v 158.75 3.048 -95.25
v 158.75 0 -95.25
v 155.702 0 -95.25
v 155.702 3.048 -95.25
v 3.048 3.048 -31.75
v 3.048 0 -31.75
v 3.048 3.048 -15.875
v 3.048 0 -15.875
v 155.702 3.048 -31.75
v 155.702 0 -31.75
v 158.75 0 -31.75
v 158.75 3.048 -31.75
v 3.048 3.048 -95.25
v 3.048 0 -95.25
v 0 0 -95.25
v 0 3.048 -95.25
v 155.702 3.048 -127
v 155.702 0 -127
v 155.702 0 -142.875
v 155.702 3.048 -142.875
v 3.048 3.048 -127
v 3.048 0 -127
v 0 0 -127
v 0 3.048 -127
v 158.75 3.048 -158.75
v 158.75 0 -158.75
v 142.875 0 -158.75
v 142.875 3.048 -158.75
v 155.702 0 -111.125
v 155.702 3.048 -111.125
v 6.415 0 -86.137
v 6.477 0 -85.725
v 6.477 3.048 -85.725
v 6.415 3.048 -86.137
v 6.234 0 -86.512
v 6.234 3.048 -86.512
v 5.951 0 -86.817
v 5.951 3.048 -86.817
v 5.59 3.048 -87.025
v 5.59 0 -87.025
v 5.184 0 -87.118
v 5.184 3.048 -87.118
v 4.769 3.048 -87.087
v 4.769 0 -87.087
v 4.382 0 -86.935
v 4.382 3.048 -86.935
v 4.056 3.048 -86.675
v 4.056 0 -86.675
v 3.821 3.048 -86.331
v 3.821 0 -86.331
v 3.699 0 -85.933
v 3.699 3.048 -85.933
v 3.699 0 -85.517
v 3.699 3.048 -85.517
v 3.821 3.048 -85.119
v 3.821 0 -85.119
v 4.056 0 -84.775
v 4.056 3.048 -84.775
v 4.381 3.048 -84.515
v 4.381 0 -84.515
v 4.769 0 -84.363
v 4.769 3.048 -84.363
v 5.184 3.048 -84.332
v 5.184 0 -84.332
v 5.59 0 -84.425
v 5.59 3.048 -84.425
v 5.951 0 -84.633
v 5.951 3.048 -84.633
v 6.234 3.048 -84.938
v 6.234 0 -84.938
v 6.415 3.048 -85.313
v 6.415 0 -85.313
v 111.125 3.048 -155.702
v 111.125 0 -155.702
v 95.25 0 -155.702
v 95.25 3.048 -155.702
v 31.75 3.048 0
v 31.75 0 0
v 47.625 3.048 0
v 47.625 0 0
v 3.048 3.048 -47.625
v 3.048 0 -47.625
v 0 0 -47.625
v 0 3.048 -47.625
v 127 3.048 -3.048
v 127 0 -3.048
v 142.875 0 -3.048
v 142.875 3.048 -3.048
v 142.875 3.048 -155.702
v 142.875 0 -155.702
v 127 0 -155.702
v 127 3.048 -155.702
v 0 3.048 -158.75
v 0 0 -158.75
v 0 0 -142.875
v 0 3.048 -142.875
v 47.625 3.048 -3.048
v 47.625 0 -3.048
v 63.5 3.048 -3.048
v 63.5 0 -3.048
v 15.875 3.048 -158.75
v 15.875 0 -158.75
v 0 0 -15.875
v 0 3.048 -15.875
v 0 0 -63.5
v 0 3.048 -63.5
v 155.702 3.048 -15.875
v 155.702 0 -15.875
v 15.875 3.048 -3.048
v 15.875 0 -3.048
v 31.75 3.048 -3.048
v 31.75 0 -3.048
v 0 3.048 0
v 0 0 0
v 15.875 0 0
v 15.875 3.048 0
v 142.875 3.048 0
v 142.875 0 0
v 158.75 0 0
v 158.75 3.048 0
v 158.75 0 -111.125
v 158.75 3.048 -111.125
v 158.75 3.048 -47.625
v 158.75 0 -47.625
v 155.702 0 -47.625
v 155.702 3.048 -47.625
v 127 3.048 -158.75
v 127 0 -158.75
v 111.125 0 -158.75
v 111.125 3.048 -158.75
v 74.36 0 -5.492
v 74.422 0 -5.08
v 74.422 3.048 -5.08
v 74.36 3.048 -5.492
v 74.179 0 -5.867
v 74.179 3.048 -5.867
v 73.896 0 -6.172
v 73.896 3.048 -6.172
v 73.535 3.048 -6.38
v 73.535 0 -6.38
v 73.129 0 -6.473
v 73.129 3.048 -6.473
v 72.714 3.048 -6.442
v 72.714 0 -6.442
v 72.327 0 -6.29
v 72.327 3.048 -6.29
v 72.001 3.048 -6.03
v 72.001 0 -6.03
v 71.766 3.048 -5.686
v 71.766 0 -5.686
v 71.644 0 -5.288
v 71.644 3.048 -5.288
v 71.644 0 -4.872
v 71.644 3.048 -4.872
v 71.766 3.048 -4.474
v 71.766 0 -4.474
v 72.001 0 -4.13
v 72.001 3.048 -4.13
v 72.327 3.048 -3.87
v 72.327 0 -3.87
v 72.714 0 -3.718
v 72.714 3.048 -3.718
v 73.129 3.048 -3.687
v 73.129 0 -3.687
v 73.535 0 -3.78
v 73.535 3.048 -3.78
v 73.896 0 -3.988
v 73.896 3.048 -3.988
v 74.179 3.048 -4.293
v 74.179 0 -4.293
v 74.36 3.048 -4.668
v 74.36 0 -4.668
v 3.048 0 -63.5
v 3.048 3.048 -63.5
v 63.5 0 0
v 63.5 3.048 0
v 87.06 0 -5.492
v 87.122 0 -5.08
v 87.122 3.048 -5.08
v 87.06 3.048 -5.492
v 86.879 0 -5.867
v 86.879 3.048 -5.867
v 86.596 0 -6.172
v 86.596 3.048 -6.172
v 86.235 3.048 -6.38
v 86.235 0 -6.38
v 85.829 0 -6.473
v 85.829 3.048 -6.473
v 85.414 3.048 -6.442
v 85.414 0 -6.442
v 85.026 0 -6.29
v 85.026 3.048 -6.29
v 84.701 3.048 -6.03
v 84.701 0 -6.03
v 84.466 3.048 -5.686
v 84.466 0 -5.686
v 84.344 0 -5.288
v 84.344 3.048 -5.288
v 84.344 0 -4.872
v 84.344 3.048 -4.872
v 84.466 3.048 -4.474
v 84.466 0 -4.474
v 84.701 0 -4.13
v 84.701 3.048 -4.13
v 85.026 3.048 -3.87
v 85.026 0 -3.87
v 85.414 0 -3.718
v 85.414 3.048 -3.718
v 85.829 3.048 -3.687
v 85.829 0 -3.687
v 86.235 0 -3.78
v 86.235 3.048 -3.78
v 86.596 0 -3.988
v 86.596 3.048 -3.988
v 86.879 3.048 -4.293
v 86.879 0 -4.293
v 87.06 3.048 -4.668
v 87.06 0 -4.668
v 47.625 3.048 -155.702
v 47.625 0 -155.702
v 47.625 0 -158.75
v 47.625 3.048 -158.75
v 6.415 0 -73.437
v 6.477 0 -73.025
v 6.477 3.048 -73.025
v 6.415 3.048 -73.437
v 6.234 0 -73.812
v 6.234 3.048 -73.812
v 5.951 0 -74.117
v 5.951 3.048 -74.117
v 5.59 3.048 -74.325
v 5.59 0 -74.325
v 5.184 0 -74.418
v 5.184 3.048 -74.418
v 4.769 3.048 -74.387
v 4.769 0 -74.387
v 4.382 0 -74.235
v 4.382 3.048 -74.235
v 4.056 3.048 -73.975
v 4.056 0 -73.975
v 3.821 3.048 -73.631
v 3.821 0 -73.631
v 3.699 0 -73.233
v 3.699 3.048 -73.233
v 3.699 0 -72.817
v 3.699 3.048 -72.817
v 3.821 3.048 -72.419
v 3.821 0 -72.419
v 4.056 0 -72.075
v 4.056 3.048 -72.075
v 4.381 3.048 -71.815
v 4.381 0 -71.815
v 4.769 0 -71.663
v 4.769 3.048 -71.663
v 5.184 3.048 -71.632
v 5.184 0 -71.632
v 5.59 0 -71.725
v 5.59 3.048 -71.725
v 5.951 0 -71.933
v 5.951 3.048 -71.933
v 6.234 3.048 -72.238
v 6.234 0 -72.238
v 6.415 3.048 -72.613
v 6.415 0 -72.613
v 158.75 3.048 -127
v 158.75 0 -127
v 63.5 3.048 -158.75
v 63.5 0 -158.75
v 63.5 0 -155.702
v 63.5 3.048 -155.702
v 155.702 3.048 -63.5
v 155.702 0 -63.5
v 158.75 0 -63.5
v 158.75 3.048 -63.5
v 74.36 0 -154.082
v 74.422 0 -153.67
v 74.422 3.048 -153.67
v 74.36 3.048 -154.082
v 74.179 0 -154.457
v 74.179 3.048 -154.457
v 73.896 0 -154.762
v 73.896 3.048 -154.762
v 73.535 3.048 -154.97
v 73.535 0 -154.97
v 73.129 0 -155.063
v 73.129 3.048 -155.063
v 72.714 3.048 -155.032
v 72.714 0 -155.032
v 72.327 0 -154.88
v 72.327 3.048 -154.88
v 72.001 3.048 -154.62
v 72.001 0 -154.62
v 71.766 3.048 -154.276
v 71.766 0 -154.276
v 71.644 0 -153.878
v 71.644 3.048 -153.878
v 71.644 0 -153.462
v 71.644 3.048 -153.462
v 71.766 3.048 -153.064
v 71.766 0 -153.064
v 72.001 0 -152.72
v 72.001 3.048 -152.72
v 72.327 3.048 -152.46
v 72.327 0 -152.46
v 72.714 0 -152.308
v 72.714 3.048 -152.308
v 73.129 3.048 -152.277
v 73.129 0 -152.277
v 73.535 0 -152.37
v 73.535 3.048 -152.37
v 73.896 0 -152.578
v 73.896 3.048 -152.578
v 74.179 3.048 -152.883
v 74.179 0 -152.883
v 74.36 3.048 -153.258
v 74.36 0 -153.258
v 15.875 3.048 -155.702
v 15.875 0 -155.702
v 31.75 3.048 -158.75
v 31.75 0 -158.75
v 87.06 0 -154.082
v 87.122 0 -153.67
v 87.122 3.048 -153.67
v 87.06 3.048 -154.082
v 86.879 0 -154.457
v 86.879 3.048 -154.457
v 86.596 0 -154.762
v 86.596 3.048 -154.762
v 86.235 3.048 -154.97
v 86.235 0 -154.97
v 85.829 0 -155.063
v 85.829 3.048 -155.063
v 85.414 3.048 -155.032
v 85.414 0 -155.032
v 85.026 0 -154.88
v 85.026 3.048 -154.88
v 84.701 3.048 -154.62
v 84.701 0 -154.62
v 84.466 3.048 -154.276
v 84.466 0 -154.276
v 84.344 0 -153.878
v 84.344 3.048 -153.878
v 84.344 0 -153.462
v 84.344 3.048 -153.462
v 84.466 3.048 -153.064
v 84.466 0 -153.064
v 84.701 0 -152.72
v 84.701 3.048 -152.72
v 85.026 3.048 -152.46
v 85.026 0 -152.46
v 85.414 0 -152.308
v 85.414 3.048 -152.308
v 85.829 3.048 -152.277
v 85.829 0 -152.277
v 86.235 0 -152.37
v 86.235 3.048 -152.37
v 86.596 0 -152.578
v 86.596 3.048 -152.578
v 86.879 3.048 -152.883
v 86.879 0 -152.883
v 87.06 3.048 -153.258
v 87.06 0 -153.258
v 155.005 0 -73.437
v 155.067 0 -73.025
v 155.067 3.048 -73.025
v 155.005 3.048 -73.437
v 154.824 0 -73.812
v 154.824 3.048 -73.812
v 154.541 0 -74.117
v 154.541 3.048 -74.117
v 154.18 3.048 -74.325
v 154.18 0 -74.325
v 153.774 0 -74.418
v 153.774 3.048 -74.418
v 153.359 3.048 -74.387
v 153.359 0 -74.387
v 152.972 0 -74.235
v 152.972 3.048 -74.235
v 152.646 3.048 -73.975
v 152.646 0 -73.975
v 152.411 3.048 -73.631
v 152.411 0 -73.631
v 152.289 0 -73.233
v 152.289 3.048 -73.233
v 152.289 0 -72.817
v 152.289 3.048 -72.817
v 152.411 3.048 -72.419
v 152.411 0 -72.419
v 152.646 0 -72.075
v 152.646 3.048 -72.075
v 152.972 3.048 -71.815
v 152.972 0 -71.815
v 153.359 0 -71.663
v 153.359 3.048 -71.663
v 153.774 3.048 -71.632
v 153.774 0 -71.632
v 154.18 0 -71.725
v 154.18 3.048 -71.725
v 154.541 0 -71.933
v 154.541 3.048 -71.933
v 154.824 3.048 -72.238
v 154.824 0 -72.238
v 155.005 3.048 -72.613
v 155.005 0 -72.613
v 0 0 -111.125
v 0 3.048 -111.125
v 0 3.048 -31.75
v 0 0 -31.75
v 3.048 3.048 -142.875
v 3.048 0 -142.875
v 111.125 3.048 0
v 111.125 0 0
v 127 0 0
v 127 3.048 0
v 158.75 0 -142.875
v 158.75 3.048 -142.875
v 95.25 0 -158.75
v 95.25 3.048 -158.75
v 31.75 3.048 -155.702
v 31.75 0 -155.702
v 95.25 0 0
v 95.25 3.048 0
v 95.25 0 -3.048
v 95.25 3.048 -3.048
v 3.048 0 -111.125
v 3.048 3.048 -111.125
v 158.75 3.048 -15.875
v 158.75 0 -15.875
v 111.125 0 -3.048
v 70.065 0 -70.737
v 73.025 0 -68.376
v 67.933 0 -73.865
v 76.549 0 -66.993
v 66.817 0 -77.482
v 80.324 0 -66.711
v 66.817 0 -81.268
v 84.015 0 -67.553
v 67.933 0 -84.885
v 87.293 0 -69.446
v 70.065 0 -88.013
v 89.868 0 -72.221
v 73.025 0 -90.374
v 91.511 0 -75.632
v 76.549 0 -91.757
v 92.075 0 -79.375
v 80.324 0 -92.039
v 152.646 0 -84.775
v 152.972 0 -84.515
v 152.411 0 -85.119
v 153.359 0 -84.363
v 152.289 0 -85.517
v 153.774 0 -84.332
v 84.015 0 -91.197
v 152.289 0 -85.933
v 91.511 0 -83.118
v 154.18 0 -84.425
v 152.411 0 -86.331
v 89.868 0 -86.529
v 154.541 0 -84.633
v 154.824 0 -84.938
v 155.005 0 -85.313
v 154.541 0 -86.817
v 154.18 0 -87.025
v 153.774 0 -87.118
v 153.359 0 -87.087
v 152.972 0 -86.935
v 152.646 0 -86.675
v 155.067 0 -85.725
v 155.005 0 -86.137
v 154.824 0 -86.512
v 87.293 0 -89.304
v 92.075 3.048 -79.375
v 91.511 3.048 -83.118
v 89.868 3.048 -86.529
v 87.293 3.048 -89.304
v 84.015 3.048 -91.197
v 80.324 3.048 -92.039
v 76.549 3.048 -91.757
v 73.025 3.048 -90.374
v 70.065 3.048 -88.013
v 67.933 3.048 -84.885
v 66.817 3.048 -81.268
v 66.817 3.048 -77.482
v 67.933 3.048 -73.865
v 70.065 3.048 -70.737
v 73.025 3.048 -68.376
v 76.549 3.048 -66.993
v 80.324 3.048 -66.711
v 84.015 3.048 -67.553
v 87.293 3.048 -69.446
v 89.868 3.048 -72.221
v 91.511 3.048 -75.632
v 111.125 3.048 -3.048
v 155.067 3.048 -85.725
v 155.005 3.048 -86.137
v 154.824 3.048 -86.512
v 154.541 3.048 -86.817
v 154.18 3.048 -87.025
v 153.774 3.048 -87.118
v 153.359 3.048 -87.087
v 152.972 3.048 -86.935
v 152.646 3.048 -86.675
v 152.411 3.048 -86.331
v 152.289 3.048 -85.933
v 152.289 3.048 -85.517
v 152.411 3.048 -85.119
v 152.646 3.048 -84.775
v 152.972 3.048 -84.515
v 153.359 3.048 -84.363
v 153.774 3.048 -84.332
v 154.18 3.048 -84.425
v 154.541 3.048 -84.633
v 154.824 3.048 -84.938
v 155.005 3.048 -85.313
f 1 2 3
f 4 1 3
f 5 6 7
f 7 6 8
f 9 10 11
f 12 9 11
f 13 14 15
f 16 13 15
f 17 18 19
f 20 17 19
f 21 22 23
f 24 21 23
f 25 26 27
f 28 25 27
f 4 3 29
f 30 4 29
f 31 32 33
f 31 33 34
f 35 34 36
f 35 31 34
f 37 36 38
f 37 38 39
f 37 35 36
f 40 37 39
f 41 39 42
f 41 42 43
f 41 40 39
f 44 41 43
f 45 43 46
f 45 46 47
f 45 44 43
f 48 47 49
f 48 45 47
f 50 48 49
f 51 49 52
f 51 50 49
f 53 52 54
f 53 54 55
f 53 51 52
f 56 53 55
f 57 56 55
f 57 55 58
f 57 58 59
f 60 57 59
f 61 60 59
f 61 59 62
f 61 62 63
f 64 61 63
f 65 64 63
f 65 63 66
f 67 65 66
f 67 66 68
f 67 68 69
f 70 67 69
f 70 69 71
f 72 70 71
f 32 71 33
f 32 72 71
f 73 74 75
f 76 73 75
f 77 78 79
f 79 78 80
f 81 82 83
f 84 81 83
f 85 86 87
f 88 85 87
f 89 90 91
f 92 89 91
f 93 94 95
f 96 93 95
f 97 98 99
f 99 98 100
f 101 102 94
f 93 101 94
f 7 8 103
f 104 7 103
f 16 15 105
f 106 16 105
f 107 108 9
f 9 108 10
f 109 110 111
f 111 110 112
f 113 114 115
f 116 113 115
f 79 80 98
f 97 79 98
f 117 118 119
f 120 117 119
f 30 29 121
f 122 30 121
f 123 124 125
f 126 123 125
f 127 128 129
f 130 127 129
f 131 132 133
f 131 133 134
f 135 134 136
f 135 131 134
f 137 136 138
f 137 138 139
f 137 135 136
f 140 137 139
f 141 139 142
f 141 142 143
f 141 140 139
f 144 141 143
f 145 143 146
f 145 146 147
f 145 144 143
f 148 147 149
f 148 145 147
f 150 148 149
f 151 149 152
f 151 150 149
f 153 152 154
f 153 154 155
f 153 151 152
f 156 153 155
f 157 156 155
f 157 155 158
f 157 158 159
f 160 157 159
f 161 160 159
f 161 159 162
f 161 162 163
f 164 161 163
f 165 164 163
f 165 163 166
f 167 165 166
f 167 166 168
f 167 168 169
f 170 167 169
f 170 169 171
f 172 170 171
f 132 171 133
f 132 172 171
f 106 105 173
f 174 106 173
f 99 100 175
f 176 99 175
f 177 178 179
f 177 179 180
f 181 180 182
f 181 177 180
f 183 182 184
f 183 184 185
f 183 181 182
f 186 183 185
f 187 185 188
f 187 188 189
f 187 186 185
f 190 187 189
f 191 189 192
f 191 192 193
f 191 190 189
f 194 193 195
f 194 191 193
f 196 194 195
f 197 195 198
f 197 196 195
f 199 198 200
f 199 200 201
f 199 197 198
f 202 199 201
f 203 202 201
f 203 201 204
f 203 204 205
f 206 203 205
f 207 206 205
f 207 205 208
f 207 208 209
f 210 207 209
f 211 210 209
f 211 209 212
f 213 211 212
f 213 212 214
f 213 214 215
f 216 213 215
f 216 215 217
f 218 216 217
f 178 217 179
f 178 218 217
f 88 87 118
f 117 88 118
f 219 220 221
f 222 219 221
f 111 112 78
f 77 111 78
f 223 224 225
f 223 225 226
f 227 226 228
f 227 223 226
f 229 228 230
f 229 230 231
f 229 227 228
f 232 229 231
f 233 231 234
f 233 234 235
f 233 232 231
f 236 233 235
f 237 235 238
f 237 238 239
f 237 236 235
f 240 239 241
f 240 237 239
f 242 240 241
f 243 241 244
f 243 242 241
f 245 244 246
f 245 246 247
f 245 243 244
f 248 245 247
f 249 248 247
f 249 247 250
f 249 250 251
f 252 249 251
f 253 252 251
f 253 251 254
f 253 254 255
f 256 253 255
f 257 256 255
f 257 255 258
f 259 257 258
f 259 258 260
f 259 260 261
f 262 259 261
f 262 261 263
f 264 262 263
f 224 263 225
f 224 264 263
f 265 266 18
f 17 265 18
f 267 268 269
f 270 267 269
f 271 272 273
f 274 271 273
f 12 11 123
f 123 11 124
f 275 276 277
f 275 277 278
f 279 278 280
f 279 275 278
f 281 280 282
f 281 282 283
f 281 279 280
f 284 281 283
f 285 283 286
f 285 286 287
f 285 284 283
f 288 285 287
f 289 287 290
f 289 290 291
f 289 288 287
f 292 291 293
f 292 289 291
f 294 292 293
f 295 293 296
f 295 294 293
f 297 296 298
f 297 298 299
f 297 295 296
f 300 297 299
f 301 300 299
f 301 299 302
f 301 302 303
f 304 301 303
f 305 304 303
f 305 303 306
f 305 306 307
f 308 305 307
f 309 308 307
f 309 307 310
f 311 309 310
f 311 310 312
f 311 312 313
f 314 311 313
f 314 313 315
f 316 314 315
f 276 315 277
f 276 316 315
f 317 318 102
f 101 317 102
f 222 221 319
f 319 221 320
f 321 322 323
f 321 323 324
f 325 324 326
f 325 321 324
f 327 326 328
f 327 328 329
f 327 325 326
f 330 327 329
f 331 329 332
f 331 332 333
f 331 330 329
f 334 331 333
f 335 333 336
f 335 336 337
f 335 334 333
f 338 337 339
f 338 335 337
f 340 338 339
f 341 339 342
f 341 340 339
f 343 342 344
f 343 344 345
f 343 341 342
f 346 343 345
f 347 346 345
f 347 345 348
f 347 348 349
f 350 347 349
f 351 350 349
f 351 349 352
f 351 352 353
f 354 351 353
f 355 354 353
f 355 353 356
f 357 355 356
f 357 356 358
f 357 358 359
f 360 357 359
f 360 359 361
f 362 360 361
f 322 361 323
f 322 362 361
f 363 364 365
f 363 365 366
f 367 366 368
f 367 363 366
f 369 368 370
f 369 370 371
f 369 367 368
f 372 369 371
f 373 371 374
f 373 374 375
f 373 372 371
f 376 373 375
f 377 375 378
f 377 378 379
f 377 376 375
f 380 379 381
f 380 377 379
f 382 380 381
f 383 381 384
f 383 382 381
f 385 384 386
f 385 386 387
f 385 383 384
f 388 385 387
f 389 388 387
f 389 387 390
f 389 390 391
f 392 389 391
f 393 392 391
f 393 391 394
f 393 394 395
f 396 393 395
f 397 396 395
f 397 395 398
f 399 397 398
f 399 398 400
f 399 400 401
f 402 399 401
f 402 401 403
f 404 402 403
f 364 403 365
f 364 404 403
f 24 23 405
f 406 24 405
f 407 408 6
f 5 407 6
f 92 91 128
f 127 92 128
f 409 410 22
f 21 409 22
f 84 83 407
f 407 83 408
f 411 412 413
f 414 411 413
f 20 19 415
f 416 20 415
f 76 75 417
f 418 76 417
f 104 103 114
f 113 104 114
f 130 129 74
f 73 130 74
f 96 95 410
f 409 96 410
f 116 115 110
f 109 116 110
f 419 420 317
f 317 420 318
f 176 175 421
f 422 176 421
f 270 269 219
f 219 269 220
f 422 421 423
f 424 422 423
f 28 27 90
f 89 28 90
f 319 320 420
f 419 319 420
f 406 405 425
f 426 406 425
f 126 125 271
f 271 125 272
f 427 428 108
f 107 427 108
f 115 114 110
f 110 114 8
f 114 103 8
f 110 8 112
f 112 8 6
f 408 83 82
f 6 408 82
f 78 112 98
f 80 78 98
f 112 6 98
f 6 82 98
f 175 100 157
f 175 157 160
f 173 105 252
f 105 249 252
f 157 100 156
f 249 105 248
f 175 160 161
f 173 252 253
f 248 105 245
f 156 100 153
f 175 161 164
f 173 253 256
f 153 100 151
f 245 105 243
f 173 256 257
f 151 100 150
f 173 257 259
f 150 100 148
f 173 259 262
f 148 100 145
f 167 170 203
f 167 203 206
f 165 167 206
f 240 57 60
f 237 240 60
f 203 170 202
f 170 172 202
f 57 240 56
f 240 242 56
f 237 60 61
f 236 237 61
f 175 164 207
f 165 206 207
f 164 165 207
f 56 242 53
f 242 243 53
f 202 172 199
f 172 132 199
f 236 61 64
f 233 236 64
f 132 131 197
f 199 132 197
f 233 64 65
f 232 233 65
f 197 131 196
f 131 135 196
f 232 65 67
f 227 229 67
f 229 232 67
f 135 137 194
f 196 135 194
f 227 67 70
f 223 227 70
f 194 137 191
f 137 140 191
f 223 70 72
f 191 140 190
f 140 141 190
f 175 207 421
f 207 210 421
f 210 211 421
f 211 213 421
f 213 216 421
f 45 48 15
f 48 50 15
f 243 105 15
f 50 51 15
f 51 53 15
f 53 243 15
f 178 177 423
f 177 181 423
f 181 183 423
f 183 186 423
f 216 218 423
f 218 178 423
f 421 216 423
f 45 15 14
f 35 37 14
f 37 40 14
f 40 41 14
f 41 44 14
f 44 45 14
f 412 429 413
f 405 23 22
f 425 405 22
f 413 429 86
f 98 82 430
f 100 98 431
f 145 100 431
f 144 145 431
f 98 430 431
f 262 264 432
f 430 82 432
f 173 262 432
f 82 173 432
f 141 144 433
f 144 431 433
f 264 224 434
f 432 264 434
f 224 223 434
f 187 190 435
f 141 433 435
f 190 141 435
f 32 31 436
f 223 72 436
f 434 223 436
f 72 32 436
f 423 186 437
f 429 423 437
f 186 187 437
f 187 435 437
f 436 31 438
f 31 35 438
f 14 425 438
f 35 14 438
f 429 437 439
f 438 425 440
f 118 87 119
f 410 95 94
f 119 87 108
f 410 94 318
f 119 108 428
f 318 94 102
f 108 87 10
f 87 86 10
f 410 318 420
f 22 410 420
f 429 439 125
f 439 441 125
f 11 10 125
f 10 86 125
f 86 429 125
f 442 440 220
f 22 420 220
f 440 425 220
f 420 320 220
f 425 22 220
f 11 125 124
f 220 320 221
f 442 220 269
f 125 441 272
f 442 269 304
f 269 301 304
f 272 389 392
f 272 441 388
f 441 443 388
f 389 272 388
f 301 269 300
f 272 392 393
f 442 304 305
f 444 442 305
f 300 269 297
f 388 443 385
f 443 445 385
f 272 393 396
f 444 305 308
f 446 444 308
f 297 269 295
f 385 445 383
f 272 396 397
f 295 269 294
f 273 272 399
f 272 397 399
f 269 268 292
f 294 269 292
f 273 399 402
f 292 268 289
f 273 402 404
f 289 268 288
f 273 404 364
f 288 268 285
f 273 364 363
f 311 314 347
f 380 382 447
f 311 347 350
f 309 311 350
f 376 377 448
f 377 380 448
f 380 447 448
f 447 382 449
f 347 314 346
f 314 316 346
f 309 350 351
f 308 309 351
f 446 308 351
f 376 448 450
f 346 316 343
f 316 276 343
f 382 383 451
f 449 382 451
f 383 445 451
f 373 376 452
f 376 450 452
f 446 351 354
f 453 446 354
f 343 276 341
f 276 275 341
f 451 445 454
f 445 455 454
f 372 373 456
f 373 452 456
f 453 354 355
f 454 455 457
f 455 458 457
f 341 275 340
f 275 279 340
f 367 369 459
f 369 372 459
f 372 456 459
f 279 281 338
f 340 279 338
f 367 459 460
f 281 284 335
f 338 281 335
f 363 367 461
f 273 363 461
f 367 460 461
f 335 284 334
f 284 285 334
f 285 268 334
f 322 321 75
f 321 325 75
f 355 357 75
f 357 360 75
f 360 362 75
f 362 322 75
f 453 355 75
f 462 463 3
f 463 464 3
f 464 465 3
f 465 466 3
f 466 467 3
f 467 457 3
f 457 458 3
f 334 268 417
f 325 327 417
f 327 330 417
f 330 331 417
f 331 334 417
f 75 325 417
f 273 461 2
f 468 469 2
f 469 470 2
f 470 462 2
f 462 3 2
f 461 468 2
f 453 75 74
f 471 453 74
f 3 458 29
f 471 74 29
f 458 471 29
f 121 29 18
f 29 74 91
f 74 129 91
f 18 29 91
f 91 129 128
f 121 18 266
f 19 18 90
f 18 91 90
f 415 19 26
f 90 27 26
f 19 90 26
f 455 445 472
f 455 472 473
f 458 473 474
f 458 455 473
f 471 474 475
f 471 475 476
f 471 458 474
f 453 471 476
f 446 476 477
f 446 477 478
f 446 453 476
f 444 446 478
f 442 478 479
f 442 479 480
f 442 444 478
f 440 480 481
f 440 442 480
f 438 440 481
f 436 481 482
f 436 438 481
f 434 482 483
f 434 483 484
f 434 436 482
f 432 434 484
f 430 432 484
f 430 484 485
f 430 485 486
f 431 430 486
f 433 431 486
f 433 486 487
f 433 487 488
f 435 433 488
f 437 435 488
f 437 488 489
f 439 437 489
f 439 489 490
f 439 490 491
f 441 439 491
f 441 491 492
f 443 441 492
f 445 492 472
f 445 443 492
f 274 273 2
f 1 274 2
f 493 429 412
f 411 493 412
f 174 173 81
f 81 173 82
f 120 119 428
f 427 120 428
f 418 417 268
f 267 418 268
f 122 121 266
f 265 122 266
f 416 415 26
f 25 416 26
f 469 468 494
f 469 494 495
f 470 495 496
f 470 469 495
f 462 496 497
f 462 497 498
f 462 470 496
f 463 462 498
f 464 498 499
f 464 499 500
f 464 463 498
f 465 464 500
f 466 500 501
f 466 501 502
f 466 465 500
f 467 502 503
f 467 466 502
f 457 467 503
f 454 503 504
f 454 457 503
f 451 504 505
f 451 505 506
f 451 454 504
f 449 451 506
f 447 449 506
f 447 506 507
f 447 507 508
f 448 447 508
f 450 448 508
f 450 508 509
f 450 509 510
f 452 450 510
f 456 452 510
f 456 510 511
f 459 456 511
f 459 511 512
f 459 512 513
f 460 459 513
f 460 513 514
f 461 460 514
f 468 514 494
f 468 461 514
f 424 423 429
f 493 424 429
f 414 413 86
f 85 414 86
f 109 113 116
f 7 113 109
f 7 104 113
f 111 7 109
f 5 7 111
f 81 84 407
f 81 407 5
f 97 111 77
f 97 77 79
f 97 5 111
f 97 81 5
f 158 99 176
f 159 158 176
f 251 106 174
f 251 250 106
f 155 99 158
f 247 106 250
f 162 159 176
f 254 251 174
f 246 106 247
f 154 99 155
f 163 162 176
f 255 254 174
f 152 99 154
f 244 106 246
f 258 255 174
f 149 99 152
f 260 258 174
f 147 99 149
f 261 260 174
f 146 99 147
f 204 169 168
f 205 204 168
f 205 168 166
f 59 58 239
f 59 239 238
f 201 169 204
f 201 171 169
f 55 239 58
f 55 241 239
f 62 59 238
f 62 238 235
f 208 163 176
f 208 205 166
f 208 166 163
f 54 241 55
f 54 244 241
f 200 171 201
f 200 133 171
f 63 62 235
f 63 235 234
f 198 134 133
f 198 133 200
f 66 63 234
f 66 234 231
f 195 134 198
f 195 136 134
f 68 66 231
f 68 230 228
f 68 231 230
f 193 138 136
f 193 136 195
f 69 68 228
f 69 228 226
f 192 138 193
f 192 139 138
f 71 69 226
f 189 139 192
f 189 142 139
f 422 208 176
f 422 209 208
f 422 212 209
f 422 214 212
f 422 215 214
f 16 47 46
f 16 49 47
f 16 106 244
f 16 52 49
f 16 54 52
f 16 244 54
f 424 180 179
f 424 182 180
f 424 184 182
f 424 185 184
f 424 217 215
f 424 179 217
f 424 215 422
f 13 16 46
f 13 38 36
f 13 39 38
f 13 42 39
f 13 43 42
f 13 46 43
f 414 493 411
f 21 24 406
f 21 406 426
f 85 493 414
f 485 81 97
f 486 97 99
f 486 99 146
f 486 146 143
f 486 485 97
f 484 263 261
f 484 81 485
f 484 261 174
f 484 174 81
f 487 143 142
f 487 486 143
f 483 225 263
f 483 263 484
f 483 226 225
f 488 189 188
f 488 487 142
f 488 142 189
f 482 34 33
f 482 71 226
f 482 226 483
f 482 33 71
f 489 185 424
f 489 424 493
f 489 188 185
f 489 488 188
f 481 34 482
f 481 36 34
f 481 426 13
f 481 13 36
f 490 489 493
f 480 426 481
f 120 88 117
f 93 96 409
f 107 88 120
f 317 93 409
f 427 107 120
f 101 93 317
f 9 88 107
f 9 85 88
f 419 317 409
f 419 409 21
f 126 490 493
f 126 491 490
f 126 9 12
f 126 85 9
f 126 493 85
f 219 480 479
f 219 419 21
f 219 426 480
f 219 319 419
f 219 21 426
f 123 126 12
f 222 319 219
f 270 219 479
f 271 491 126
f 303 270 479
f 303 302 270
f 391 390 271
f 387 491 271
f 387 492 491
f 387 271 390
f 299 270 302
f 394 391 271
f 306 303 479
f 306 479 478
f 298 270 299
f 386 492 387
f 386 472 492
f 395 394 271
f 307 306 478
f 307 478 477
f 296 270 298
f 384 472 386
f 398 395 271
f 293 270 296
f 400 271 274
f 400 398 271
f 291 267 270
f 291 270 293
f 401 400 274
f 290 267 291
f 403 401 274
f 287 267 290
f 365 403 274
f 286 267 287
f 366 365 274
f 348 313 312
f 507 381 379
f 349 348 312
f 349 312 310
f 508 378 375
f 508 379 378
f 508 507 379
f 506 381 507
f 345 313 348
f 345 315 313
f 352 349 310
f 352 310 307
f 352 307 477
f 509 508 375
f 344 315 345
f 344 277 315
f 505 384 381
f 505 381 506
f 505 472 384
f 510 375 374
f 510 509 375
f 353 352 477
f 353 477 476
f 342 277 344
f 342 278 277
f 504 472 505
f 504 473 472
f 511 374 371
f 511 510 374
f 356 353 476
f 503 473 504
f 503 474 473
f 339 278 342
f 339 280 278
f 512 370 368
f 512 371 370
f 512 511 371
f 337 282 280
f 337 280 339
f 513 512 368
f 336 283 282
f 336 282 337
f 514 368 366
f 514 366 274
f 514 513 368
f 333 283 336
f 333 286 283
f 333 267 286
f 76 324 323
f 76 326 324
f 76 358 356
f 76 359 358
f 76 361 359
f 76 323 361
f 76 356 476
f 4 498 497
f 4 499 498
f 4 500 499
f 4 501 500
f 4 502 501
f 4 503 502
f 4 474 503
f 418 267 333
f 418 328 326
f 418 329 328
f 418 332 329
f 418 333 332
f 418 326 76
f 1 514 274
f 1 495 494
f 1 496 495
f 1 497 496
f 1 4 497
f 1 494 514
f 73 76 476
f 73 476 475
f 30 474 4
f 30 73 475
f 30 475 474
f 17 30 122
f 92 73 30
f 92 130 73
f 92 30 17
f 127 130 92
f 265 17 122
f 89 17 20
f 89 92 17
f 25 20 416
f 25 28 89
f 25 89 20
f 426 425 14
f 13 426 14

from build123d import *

# Parameters (mm, degrees)
SKETCH1_R           = 12.7
SKETCH1_R_2         = 1.397
BOSS_EXTRUDE1_DEPTH = 3.048


with BuildPart() as part:
    # Sketch1 → Boss-Extrude1 (new body)
    with BuildSketch(Plane(origin=(0, 0, 0), x_dir=(1, 0, 0), z_dir=(0, 1, 0))):
        Polygon((0, 0), (15.875, 0), (15.875, 3.048), (31.75, 3.048), (31.75, 0), (47.625, 0), (47.625, 3.048), (63.5, 3.048), (63.5, 0), (95.25, 0), (95.25, 3.048), (111.125, 3.048), (111.125, 0), (127, 0), (127, 3.048), (142.875, 3.048), (142.875, 0), (158.75, 0), (158.75, 15.875), (155.702, 15.875), (155.702, 31.75), (158.75, 31.75), (158.75, 47.625), (155.702, 47.625), (155.702, 63.5), (158.75, 63.5), (158.75, 95.25), (155.702, 95.25), (155.702, 111.125), (158.75, 111.125), (158.75, 127), (155.702, 127), (155.702, 142.875), (158.75, 142.875), (158.75, 158.75), (142.875, 158.75), (142.875, 155.702), (127, 155.702), (127, 158.75), (111.125, 158.75), (111.125, 155.702), (95.25, 155.702), (95.25, 158.75), (63.5, 158.75), (63.5, 155.702), (47.625, 155.702), (47.625, 158.75), (31.75, 158.75), (31.75, 155.702), (15.875, 155.702), (15.875, 158.75), (0, 158.75), (0, 142.875), (3.048, 142.875), (3.048, 127), (0, 127), (0, 111.125), (3.048, 111.125), (3.048, 95.25), (0, 95.25), (0, 63.5), (3.048, 63.5), (3.048, 47.625), (0, 47.625), (0, 31.75), (3.048, 31.75), (3.048, 15.875), (0, 15.875), align=None)
        with Locations((79.375, 79.375)):
            Circle(SKETCH1_R, mode=Mode.SUBTRACT)
        with Locations((73.025, 153.67)):
            Circle(SKETCH1_R_2, mode=Mode.SUBTRACT)
        with Locations((85.725, 153.67)):
            Circle(SKETCH1_R_2, mode=Mode.SUBTRACT)
        with Locations((153.67, 73.025)):
            Circle(SKETCH1_R_2, mode=Mode.SUBTRACT)
        with Locations((153.67, 85.725)):
            Circle(SKETCH1_R_2, mode=Mode.SUBTRACT)
        with Locations((5.08, 85.725)):
            Circle(SKETCH1_R_2, mode=Mode.SUBTRACT)
        with Locations((5.08, 73.025)):
            Circle(SKETCH1_R_2, mode=Mode.SUBTRACT)
        with Locations((73.025, 5.08)):
            Circle(SKETCH1_R_2, mode=Mode.SUBTRACT)
        with Locations((85.725, 5.08)):
            Circle(SKETCH1_R_2, mode=Mode.SUBTRACT)
    extrude(amount=BOSS_EXTRUDE1_DEPTH)


solid = part.part
